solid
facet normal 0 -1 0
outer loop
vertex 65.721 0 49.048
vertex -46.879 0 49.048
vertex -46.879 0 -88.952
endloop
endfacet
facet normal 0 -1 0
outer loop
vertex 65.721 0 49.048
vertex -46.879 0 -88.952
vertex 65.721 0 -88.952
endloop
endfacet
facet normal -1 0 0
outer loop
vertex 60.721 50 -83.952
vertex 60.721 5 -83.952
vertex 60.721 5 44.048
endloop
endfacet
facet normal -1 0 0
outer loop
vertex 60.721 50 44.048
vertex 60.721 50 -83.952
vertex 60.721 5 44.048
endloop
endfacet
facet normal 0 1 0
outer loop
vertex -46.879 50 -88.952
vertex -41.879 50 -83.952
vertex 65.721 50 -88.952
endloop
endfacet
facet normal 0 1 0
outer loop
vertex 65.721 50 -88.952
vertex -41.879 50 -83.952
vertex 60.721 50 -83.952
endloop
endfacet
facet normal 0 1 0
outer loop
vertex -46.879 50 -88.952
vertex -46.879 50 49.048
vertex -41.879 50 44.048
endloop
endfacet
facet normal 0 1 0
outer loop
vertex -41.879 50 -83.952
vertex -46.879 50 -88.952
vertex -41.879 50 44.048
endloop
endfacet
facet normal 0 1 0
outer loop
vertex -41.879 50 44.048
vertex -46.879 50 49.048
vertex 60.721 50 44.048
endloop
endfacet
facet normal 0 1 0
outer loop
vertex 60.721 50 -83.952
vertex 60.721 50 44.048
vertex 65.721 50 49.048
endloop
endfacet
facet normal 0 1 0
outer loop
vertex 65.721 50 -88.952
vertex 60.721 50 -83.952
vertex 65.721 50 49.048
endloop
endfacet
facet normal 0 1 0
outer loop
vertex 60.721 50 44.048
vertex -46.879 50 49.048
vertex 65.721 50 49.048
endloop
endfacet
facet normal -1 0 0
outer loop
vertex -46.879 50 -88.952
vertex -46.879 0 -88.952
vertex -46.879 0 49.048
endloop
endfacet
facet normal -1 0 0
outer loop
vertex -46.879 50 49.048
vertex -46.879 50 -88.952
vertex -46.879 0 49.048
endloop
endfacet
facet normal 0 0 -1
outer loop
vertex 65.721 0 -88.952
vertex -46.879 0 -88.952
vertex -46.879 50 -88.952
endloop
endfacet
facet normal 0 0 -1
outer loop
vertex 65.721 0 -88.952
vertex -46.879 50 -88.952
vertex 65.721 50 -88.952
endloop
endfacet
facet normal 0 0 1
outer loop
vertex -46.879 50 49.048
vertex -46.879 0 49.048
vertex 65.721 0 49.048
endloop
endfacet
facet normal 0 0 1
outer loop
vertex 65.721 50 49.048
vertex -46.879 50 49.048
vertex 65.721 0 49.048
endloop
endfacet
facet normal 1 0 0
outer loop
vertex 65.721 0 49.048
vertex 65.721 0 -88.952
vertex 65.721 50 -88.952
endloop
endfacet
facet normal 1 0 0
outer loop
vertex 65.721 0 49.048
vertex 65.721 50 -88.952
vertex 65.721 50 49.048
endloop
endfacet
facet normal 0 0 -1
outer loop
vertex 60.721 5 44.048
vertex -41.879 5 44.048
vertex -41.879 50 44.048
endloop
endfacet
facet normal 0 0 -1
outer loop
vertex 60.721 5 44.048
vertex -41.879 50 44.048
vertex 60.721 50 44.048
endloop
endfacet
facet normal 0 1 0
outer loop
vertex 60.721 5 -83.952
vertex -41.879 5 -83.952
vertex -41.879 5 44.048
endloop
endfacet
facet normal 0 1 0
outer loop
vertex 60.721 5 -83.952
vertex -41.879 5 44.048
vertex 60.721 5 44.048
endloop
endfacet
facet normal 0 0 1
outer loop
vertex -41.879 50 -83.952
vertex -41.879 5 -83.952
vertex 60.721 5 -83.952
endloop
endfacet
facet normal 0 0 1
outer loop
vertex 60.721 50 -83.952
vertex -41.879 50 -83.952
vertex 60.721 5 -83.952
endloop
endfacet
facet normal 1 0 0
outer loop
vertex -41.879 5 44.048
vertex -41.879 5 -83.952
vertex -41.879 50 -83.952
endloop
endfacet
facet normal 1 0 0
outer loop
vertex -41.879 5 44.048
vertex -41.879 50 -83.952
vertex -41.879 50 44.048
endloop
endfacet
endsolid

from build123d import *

# Parameters (mm, degrees)
SKETCH1_W           = 101.6
SKETCH1_H           = 127
BOSS_EXTRUDE1_DEPTH = 5
SKETCH4_W           = 102.6
SKETCH4_H           = 128
BOSS_EXTRUDE3_DEPTH = 5
SKETCH5_W           = 112.6
SKETCH5_H           = 138
SKETCH5_W_2         = 102.6
SKETCH5_H_2         = 128
BOSS_EXTRUDE4_DEPTH = 50


with BuildPart() as part:
    # Sketch1 → Boss-Extrude1 (new body)
    with BuildSketch(Plane(origin=(0, 0, 0), x_dir=(1, 0, 0), z_dir=(0, 1, 0))):
        with Locations((9.420607765, 19.952255333)):
            Rectangle(SKETCH1_W, SKETCH1_H)
    extrude(amount=BOSS_EXTRUDE1_DEPTH)

    # Sketch4 → Boss-Extrude3 (add)
    with BuildSketch(Plane(origin=(0, 5, 0), x_dir=(1, 0, 0), z_dir=(0, 1, 0))):
        with Locations((9.420607765, 19.952255333)):
            Rectangle(SKETCH4_W, SKETCH4_H)
    extrude(amount=-BOSS_EXTRUDE3_DEPTH)

    # Sketch5 → Boss-Extrude4 (add)
    with BuildSketch(Plane.XZ):
        with Locations((9.420607765, -19.952255333)):
            Rectangle(SKETCH5_W, SKETCH5_H)
        with Locations((9.420607765, -19.952255333)):
            Rectangle(SKETCH5_W_2, SKETCH5_H_2, mode=Mode.SUBTRACT)
    extrude(amount=-BOSS_EXTRUDE4_DEPTH)


solid = part.part
